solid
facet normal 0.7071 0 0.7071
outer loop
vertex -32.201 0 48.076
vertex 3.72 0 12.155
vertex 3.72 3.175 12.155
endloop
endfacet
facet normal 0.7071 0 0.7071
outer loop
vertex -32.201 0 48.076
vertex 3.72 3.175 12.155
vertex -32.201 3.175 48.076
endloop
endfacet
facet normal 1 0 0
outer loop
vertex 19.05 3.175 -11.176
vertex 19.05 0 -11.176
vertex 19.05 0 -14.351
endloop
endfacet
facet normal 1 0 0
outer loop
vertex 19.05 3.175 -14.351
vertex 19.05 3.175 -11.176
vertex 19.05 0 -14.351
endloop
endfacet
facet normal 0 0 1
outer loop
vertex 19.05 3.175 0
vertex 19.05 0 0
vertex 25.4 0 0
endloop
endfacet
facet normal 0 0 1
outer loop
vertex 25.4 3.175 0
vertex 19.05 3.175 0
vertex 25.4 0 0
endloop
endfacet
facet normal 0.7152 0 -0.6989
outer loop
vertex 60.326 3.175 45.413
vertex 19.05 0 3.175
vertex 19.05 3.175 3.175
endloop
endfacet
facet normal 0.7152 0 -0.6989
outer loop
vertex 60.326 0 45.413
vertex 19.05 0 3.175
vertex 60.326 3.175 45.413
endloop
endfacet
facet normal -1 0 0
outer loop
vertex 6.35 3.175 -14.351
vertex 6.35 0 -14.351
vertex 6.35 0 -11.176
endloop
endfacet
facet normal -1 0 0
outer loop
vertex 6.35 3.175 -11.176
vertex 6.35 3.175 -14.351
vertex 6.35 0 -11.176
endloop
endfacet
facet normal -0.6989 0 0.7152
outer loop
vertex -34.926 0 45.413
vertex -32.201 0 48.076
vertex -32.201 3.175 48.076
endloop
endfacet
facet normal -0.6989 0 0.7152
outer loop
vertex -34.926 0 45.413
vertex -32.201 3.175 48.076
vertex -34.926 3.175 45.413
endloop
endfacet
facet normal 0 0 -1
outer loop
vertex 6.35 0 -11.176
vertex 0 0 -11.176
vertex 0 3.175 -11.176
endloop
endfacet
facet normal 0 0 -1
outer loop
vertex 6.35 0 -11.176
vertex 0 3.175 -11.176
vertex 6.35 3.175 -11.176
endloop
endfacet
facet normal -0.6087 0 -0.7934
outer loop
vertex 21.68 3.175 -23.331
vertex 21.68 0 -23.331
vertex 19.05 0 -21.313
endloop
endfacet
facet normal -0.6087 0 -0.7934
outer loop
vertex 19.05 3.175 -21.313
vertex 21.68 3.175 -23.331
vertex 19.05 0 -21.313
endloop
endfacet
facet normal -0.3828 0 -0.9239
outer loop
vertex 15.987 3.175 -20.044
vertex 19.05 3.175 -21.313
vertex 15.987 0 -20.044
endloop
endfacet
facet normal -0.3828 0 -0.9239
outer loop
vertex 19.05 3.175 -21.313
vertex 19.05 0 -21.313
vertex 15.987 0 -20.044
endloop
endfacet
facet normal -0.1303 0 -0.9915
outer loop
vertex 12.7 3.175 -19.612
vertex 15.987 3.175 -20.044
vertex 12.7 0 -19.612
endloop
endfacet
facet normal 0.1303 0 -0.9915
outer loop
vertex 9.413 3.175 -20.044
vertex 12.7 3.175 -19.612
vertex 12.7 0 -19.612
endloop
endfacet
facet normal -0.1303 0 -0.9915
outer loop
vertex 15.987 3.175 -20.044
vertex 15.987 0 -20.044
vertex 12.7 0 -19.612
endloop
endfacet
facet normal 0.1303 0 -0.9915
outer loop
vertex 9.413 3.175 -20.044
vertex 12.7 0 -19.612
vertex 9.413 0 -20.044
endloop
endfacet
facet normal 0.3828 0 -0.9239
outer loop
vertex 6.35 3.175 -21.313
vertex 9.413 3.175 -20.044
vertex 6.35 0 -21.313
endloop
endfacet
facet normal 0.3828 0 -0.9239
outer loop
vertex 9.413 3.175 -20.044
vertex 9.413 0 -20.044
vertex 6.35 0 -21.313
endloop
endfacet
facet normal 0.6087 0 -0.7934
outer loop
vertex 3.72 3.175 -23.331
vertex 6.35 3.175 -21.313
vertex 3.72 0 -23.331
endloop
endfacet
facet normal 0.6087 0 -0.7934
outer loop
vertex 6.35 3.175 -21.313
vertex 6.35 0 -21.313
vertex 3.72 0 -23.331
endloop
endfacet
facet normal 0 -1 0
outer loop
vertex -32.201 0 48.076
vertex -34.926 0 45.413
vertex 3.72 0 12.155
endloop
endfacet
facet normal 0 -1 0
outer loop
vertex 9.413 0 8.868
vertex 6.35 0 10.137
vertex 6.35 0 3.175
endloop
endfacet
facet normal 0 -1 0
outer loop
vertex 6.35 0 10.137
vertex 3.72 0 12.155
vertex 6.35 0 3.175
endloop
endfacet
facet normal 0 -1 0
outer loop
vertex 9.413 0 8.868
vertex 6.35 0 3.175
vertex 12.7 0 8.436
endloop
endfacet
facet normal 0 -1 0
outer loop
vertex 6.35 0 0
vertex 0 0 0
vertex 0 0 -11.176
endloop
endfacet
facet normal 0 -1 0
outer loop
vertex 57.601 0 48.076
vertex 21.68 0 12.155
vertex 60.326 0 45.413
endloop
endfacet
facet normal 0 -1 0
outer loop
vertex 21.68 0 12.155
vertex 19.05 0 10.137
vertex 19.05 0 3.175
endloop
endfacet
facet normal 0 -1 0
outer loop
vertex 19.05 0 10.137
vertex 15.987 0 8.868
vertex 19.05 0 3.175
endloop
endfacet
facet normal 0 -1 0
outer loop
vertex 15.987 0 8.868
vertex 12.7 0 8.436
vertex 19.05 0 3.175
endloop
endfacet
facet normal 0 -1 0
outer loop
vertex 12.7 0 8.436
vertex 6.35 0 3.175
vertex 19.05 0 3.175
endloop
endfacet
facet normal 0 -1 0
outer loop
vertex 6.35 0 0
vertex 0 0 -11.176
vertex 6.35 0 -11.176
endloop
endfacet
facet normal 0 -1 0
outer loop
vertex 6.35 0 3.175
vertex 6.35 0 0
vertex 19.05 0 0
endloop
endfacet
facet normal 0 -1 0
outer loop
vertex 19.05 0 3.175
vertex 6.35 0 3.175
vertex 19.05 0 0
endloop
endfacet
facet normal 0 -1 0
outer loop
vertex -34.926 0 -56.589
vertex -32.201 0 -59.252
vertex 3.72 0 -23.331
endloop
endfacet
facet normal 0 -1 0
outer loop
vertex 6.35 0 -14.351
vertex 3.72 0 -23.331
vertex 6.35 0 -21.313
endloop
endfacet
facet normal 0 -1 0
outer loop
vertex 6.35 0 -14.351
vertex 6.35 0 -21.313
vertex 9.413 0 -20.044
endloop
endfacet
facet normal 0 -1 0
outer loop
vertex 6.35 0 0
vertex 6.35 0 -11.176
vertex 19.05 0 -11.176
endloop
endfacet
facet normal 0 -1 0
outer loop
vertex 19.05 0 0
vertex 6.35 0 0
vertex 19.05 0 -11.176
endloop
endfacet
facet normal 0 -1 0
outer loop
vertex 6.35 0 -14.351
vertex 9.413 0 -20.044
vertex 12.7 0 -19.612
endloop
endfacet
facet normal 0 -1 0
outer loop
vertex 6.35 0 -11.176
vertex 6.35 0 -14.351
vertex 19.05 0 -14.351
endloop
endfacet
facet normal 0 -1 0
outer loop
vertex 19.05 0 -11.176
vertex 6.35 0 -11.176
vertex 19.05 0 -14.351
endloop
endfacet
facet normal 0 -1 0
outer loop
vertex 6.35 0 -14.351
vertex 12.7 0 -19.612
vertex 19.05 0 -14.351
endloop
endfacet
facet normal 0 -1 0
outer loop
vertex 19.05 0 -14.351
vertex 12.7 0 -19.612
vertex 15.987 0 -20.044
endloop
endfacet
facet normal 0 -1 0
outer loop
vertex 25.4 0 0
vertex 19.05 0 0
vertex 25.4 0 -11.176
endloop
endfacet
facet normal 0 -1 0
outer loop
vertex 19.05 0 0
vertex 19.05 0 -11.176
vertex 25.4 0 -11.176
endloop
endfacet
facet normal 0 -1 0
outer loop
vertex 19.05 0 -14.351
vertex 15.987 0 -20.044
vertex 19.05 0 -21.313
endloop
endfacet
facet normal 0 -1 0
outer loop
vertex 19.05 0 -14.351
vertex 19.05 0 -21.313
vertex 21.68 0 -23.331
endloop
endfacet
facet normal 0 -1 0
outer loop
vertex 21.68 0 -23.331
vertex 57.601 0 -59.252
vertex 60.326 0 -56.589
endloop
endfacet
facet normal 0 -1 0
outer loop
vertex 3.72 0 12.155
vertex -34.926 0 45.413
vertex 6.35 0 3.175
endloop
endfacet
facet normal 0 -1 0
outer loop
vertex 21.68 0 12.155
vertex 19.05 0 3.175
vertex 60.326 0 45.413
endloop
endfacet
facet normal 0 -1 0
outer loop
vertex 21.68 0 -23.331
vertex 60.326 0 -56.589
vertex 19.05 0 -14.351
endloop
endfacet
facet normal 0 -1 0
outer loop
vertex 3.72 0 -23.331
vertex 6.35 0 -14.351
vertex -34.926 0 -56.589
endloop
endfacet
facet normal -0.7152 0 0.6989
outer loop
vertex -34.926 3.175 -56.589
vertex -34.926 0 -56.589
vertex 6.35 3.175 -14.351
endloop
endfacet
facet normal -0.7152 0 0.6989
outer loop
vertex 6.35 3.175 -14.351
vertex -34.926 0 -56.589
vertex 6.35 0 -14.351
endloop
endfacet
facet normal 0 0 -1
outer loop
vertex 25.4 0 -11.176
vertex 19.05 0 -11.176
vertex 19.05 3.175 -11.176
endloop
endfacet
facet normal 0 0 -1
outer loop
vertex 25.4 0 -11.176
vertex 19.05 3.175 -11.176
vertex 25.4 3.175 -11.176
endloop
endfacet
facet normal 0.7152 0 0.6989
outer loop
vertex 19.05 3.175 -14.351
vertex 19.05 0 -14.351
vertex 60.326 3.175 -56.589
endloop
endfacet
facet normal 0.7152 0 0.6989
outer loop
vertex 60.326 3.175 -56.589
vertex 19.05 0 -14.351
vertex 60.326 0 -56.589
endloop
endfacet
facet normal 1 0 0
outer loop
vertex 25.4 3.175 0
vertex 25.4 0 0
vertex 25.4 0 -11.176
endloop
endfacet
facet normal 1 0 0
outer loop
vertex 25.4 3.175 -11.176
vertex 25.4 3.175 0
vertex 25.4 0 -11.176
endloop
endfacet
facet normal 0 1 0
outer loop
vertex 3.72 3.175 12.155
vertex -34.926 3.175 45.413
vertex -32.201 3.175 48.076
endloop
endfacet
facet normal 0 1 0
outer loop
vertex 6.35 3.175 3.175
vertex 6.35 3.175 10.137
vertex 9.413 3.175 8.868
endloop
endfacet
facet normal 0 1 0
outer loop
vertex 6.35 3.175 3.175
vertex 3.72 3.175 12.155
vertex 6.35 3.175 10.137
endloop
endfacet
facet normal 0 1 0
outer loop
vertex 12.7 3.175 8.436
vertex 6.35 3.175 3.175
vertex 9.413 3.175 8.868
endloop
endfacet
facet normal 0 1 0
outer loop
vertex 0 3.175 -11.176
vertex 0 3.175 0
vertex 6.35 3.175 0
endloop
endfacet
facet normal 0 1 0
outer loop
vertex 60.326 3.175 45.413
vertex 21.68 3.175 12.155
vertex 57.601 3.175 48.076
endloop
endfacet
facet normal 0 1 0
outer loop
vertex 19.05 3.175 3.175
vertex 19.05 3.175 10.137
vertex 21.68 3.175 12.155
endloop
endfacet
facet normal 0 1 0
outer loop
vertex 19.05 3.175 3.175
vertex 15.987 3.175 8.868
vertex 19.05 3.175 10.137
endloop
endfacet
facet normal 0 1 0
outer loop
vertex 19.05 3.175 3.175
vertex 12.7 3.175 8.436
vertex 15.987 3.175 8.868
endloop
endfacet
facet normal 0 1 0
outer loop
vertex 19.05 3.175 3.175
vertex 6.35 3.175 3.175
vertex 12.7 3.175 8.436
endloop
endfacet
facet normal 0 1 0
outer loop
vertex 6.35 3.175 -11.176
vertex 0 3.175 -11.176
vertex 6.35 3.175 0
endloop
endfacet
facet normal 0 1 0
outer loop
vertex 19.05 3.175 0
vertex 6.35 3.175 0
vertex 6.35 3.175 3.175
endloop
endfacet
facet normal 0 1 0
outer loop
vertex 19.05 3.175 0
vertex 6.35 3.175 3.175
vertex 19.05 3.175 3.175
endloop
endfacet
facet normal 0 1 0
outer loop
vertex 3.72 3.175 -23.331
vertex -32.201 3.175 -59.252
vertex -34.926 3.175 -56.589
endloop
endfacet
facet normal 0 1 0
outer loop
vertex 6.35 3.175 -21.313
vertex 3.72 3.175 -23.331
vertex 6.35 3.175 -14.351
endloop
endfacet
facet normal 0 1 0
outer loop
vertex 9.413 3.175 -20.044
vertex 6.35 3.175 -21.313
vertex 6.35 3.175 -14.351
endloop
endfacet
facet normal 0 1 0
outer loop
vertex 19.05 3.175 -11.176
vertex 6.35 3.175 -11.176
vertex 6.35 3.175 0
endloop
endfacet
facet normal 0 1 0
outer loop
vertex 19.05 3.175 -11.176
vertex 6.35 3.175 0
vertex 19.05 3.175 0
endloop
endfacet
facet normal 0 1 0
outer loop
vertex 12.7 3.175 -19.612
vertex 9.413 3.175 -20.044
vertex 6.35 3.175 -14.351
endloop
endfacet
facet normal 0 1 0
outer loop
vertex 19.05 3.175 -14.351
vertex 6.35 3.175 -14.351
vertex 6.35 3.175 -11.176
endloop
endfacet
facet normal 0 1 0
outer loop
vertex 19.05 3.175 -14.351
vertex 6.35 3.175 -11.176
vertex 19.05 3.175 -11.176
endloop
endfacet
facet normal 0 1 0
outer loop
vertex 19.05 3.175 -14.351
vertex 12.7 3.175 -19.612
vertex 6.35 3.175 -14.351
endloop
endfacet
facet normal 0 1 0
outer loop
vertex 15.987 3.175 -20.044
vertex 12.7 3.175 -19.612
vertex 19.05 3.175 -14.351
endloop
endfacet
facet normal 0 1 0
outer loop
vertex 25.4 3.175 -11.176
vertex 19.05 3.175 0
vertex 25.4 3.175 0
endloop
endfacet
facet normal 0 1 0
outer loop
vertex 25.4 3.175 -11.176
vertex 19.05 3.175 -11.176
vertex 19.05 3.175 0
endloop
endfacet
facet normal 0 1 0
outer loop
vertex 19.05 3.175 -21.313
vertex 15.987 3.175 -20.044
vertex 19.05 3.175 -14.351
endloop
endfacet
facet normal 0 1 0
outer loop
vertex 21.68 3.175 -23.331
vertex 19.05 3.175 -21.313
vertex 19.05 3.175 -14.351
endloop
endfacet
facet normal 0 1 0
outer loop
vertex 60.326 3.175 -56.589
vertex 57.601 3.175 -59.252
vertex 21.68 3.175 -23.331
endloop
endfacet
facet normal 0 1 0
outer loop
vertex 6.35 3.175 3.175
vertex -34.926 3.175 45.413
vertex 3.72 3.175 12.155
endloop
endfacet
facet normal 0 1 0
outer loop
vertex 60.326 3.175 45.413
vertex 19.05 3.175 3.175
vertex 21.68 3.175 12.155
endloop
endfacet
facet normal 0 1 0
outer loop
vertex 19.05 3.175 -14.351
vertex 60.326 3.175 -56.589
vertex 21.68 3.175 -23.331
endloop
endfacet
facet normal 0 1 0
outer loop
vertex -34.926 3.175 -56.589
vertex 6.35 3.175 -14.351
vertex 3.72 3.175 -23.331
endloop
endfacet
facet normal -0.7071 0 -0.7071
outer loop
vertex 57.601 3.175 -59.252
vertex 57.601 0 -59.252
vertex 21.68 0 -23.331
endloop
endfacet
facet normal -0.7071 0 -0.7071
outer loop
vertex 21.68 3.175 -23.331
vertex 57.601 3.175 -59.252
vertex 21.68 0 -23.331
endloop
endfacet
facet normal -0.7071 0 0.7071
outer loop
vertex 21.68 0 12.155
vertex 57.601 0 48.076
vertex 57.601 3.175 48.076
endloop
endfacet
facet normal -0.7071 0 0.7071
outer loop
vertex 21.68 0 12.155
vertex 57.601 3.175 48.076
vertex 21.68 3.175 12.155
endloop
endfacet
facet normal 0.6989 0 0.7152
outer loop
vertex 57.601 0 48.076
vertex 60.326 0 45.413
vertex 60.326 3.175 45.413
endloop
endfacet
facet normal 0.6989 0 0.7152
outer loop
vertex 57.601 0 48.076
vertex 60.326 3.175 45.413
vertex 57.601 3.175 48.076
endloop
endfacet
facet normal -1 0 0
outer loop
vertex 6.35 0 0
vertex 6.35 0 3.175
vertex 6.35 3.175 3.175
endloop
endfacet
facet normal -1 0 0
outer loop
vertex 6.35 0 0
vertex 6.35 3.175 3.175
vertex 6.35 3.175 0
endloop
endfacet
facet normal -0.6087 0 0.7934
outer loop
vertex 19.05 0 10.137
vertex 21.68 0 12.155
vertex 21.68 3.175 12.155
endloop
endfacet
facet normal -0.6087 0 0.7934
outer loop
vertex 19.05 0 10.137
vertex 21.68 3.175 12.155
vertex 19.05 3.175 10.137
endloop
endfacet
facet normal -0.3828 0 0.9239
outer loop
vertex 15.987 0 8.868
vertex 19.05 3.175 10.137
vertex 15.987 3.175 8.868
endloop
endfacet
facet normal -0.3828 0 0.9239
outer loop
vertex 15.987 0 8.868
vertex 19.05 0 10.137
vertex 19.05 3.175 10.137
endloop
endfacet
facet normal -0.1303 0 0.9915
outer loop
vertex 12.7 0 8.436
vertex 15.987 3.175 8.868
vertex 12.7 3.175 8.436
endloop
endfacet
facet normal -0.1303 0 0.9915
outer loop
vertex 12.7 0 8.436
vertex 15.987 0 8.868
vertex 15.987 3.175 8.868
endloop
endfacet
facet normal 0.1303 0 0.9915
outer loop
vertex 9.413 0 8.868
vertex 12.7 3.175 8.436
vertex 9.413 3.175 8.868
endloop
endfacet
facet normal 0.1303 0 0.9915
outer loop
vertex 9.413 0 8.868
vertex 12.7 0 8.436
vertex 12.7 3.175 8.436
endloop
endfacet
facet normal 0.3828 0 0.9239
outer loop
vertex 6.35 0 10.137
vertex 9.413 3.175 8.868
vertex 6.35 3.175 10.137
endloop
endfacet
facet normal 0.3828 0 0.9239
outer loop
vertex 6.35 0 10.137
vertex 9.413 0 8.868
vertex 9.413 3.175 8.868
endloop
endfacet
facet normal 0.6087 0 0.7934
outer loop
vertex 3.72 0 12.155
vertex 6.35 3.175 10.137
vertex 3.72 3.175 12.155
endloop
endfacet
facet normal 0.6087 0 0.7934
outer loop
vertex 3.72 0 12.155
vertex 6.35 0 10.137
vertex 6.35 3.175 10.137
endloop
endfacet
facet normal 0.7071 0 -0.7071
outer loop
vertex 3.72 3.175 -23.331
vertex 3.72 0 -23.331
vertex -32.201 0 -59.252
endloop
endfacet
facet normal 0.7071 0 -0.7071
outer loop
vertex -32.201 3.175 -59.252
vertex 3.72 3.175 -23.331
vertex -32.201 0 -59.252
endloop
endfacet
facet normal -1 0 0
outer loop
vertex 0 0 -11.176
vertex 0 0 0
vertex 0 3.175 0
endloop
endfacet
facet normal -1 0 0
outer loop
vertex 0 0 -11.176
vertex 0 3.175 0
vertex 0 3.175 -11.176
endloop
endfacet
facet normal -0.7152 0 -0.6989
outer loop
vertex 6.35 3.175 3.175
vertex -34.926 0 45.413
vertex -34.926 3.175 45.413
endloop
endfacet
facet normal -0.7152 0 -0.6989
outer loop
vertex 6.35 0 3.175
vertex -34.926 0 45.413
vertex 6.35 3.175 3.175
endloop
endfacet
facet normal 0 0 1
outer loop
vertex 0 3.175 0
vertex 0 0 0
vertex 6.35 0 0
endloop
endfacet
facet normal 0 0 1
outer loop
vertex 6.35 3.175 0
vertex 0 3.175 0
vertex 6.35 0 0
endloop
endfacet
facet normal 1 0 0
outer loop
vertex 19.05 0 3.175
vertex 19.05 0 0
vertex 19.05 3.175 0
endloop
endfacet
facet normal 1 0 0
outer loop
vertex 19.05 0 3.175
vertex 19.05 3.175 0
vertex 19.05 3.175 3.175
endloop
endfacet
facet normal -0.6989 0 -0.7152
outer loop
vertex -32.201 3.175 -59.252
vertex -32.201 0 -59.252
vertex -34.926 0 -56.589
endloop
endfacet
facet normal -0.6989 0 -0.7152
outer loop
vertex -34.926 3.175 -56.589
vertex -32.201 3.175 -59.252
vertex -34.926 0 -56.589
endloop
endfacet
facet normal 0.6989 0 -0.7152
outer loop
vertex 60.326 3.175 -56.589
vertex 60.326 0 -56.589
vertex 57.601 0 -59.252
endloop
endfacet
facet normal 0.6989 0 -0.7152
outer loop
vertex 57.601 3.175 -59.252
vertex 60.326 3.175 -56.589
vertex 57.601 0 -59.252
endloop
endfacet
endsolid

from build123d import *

# Parameters (mm, degrees)
SKETCH1_W           = 25.4
SKETCH1_H           = 11.176
BOSS_EXTRUDE1_DEPTH = 3.175


with BuildPart() as part:
    # Sketch1 → Boss-Extrude1 (new body)
    with BuildSketch(Plane(origin=(0, 0, 0), x_dir=(1, 0, 0), z_dir=(0, 1, 0))):
        with Locations((12.7, 5.588)):
            Rectangle(SKETCH1_W, SKETCH1_H)
        with BuildLine():
            Line((19.05, 11.176), (19.05, 14.351))
            Line((19.05, 14.351), (60.326216075, 56.589419985))
            Line((60.326216075, 56.589419985), (57.601280605, 59.252280605))
            Line((57.601280605, 59.252280605), (21.680256121, 23.331256121))
            ThreePointArc((21.680256121, 23.331256121), (12.7, 19.611512242), (3.719743879, 23.331256121))
            Line((3.719743879, 23.331256121), (-32.201280605, 59.252280605))
            Line((-32.201280605, 59.252280605), (-34.926216075, 56.589419985))
            Line((-34.926216075, 56.589419985), (6.35, 14.351))
            Line((6.35, 14.351), (6.35, 11.176))
            Line((6.35, 11.176), (19.05, 11.176))
        make_face()
        with BuildLine():
            Line((19.05, 0), (19.05, -3.175))
            Line((19.05, -3.175), (60.326216075, -45.413419985))
            Line((60.326216075, -45.413419985), (57.601280605, -48.076280605))
            Line((57.601280605, -48.076280605), (21.680256121, -12.155256121))
            ThreePointArc((21.680256121, -12.155256121), (12.7, -8.435512242), (3.719743879, -12.155256121))
            Line((3.719743879, -12.155256121), (-32.201280605, -48.076280605))
            Line((-32.201280605, -48.076280605), (-34.926216075, -45.413419985))
            Line((-34.926216075, -45.413419985), (6.35, -3.175))
            Line((6.35, -3.175), (6.35, 0))
            Line((6.35, 0), (19.05, 0))
        make_face()
    extrude(amount=BOSS_EXTRUDE1_DEPTH)


solid = part.part
